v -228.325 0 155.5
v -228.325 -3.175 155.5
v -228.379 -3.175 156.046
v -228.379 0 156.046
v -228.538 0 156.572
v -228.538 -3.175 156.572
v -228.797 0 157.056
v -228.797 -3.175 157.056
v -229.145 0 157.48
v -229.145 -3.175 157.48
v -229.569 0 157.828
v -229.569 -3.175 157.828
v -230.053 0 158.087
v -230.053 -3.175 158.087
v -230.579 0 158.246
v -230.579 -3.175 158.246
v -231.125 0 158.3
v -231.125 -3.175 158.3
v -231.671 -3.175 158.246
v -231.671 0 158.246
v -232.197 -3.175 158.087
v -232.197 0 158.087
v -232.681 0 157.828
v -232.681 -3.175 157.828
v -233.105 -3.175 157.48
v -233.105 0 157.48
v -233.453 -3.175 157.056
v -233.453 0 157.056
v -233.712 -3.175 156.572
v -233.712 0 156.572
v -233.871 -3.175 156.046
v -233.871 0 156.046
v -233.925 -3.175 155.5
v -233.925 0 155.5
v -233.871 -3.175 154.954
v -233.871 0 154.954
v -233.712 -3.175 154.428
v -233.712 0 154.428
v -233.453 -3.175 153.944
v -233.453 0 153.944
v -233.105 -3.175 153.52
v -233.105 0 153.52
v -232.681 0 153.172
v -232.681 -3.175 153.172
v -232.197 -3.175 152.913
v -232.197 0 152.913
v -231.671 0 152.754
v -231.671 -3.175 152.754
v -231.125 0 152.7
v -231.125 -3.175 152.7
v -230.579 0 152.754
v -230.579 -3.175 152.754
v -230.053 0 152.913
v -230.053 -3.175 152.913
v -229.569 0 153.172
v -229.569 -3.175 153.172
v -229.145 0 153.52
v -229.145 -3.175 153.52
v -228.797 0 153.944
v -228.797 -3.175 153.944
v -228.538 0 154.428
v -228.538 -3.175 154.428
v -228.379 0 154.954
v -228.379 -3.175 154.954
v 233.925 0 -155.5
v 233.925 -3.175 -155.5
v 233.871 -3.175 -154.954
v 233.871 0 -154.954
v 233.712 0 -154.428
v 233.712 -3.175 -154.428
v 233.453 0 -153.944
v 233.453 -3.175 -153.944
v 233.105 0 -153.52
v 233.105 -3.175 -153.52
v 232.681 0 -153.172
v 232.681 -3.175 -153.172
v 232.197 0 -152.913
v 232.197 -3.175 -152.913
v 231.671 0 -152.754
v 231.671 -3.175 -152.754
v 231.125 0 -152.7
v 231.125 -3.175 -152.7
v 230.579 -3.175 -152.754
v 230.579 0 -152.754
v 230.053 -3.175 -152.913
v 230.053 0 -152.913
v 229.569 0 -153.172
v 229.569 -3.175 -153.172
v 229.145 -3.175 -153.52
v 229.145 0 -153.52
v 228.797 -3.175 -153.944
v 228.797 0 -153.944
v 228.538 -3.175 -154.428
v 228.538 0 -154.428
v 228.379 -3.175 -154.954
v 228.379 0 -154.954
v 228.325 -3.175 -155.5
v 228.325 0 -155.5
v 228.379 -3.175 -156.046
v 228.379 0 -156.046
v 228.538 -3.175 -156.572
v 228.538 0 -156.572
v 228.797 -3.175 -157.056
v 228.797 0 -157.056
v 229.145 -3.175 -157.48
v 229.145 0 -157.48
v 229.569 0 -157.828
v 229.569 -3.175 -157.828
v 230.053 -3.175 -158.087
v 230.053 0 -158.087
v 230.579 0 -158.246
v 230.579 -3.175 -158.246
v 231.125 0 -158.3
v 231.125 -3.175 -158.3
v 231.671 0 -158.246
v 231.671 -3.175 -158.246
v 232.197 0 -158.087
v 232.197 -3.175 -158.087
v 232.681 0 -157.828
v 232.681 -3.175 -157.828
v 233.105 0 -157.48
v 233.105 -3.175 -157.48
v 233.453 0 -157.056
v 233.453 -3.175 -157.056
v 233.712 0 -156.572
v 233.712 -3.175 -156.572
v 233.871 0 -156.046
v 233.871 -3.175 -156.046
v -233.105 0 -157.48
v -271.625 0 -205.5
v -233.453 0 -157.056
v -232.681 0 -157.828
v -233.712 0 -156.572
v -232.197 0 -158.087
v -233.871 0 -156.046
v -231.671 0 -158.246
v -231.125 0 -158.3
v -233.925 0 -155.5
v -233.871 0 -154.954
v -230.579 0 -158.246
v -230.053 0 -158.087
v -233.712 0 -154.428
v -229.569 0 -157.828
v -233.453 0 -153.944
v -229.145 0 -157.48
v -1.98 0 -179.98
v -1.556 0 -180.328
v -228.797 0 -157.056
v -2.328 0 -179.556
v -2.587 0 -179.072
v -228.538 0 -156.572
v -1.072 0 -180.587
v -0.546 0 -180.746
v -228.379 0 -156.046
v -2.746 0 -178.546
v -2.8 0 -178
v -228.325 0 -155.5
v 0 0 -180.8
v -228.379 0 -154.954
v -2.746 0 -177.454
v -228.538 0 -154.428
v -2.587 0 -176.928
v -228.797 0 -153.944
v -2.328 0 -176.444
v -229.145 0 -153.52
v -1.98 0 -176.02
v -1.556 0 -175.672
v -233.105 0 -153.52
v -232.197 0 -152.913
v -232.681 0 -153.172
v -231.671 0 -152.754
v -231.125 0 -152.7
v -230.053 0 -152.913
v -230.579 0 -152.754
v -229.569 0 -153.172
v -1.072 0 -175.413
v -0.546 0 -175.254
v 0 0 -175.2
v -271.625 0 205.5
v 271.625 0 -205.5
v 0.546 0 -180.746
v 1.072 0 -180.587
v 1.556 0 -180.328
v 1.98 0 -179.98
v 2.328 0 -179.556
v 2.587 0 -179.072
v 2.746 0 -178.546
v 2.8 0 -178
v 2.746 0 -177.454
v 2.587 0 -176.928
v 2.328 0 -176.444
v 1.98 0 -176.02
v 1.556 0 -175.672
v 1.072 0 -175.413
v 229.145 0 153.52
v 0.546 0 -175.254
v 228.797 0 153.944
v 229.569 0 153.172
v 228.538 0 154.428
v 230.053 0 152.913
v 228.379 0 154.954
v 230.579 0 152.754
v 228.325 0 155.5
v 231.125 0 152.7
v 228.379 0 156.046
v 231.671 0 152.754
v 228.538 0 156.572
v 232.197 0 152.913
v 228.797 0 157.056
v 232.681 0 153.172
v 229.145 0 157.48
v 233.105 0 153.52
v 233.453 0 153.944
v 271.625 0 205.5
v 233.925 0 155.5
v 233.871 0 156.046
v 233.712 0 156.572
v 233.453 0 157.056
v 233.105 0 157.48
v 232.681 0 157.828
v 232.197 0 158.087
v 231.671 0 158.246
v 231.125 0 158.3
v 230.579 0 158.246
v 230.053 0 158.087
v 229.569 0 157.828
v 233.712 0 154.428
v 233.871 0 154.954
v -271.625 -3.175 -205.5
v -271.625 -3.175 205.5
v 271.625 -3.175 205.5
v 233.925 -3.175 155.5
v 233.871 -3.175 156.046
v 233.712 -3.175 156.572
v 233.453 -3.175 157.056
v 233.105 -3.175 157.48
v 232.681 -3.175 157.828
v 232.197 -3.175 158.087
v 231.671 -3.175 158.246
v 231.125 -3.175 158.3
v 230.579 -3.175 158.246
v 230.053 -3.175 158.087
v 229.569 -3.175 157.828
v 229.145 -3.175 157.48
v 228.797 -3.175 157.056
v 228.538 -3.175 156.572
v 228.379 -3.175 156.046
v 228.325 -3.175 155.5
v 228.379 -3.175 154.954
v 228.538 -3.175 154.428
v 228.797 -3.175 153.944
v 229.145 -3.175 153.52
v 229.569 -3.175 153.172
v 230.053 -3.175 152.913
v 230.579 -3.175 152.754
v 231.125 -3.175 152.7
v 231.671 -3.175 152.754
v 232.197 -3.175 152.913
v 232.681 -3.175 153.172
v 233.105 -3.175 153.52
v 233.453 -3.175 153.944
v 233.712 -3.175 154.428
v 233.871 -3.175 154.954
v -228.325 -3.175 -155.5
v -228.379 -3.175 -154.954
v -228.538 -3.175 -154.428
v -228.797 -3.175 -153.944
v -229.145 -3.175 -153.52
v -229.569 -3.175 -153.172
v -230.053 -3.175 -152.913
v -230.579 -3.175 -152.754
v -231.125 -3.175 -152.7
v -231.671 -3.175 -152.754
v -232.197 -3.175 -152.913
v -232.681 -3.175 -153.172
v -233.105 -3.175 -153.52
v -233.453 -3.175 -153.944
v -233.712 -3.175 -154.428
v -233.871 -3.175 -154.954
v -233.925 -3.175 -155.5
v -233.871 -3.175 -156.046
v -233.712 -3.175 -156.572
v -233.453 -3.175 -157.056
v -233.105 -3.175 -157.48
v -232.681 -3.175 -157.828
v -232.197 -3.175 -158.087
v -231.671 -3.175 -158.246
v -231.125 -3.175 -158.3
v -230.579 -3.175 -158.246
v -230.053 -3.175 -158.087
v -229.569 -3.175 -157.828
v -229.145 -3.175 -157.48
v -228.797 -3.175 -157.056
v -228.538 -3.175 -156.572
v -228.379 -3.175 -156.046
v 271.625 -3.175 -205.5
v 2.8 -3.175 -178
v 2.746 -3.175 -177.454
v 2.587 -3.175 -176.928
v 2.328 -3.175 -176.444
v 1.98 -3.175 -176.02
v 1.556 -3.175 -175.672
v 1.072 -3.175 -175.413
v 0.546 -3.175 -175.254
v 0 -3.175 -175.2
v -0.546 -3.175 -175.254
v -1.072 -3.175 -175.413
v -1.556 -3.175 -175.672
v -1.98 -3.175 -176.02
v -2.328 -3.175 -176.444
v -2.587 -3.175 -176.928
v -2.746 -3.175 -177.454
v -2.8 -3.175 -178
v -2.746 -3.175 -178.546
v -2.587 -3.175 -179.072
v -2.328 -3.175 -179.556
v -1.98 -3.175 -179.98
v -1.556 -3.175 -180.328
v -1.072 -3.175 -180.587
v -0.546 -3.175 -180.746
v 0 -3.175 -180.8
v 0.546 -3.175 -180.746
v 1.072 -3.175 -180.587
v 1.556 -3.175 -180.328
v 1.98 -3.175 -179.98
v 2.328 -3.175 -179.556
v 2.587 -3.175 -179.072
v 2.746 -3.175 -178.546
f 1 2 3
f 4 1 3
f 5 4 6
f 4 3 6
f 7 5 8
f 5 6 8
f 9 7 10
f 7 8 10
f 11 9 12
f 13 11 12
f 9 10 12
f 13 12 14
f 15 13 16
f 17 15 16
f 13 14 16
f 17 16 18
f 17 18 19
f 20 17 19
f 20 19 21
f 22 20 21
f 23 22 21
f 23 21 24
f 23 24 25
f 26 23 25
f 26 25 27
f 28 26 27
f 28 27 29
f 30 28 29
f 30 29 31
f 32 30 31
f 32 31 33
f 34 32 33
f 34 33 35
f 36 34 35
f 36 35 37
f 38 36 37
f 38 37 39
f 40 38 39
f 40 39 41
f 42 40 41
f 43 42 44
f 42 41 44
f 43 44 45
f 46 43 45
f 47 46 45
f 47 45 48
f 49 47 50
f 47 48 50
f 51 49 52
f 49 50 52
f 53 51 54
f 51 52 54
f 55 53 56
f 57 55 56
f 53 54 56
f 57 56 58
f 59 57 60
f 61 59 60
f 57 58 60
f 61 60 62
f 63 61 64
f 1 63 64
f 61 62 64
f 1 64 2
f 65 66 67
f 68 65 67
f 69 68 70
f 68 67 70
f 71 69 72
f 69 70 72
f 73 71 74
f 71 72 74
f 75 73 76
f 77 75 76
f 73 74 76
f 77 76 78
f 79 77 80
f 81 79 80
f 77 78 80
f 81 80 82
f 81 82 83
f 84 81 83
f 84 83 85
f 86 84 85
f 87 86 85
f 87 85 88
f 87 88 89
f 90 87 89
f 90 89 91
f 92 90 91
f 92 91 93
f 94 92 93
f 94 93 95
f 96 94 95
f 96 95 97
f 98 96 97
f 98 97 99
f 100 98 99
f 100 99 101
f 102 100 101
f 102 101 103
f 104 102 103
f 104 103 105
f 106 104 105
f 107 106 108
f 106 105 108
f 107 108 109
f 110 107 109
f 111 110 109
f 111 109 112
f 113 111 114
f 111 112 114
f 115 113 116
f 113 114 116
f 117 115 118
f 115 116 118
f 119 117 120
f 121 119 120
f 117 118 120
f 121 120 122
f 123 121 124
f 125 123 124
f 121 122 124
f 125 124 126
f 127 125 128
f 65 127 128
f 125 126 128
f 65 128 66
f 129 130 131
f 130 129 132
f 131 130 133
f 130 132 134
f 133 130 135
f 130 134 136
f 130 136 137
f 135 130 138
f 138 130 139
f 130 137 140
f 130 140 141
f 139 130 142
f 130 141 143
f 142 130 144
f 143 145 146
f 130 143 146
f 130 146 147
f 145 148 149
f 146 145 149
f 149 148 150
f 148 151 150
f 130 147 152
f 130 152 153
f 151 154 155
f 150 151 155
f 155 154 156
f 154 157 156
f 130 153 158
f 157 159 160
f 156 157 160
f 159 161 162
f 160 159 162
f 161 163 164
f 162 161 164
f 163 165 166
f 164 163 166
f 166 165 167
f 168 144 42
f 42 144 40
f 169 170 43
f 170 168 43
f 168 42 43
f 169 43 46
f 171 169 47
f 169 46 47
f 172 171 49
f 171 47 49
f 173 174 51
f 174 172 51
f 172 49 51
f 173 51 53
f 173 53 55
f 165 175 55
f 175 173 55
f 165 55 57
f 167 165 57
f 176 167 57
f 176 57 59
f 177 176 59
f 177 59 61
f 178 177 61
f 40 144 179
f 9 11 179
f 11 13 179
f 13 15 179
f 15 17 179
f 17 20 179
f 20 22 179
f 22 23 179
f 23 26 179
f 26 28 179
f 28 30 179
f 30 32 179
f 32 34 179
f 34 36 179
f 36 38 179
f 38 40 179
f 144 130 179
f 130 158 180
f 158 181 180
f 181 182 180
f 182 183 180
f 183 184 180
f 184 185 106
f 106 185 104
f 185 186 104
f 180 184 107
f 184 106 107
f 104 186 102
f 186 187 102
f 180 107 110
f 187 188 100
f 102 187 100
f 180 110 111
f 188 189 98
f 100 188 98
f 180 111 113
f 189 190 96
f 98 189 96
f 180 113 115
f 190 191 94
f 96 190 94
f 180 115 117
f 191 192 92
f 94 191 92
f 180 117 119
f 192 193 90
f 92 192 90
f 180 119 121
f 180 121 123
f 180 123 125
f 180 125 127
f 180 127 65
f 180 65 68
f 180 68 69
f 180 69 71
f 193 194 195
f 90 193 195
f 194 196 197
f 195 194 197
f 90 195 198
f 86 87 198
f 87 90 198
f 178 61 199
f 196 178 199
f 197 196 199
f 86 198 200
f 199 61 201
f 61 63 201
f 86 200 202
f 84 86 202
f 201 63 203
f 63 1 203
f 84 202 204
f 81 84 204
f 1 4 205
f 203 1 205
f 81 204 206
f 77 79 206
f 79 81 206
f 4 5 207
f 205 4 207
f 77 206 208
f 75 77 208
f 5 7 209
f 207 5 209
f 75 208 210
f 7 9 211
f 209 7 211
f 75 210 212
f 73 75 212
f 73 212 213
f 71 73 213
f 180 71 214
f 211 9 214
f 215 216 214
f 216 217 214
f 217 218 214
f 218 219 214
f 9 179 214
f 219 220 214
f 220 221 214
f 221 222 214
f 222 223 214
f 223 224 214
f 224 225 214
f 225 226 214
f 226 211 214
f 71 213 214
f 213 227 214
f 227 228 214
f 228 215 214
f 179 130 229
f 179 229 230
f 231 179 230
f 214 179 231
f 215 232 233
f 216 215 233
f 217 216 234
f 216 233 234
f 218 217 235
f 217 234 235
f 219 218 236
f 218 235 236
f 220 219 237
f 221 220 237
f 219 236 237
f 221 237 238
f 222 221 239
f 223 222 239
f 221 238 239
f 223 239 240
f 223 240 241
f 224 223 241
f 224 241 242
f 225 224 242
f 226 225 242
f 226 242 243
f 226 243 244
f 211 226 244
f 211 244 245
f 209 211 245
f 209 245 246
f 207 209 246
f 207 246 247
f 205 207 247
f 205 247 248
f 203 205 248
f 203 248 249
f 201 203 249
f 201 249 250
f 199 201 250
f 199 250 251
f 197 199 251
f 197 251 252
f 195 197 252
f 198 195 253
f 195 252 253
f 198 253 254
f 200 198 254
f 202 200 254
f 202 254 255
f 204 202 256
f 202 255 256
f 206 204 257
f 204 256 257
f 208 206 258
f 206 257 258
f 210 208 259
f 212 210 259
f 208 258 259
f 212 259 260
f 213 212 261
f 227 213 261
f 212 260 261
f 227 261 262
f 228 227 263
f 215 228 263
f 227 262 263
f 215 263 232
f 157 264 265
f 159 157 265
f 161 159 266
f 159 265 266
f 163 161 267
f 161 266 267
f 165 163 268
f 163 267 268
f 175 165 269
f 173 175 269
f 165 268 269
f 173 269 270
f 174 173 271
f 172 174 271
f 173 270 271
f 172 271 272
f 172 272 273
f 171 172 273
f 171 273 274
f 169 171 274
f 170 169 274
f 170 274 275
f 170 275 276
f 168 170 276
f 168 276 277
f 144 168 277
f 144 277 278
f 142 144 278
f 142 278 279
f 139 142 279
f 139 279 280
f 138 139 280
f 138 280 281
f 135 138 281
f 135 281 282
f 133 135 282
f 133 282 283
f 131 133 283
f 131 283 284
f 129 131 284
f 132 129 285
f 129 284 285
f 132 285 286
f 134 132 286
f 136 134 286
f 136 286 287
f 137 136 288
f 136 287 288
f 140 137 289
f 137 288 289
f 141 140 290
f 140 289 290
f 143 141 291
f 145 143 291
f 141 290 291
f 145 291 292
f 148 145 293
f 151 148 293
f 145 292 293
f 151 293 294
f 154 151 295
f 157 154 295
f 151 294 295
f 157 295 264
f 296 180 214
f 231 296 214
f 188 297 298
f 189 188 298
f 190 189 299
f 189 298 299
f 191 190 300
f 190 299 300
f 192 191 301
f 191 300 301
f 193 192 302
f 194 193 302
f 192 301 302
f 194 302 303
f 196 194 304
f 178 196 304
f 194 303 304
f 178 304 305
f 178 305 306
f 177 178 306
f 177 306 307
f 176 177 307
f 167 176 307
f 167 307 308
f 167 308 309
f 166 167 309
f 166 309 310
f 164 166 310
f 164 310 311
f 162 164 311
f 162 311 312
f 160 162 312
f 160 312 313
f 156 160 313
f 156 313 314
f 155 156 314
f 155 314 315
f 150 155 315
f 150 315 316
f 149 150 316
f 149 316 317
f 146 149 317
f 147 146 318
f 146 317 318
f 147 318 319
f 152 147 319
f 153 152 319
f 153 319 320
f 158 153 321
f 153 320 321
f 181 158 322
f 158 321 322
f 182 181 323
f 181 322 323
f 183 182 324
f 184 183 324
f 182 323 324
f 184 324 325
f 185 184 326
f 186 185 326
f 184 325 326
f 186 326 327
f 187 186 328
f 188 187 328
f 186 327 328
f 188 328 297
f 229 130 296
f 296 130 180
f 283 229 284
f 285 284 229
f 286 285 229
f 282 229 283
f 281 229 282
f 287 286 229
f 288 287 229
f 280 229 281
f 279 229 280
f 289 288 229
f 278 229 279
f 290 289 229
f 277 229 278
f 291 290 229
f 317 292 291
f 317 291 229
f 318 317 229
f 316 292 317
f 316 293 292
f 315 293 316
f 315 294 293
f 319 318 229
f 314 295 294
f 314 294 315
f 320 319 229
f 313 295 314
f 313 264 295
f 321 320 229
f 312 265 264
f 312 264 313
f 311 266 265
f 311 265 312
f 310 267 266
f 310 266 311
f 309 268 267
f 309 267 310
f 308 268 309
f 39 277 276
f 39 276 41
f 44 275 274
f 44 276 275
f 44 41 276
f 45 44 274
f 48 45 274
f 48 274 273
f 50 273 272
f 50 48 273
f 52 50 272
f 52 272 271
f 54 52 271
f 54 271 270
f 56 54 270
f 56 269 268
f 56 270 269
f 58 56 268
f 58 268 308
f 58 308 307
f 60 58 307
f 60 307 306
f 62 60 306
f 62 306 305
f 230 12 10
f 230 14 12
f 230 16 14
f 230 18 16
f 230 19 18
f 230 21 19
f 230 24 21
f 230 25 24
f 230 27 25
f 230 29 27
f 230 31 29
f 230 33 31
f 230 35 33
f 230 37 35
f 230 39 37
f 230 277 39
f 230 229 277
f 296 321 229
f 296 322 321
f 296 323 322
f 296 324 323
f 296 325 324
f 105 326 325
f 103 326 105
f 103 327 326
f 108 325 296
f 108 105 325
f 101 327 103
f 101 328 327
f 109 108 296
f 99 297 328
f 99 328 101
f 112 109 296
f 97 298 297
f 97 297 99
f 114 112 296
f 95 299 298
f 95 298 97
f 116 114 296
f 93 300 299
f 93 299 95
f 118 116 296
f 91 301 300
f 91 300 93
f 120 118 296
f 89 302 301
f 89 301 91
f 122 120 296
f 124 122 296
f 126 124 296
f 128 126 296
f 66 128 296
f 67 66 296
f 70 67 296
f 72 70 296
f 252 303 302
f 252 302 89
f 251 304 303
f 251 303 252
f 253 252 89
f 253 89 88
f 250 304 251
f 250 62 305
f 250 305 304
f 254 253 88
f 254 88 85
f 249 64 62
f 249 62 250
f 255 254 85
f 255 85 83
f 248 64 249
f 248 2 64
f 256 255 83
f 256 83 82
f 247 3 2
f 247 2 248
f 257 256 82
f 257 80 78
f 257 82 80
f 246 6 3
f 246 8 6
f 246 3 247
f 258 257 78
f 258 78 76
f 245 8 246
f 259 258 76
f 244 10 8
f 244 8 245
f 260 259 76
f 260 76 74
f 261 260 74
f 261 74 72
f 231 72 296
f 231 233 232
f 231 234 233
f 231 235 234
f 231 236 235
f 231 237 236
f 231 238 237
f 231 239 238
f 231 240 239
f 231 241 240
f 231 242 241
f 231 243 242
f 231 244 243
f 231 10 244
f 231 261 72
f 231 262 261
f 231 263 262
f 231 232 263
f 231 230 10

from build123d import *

# Parameters (mm, degrees)
F0_W     = 543.25
F0_H     = 411
F1_DEPTH = 3.175
F2_R     = 2.8
F3_DEPTH = 25


with BuildPart() as f1:
    # F0 (on Front) → F1 (new body)
    with BuildSketch(Plane.XZ):
        Rectangle(F0_W, F0_H)
    extrude(amount=F1_DEPTH)

    # F2 (on face) → F3 (cut)
    with BuildSketch(Plane.XZ.offset(3.175)):
        with Locations((-231.125, 155.5)):
            Circle(F2_R)
        with Locations((-231.125, -155.5)):
            Circle(F2_R)
        with Locations((0, -178)):
            Circle(F2_R)
        with Locations((231.125, -155.5)):
            Circle(F2_R)
        with Locations((231.125, 155.5)):
            Circle(F2_R)
    extrude(amount=-F3_DEPTH, mode=Mode.SUBTRACT)


solid = f1.part
